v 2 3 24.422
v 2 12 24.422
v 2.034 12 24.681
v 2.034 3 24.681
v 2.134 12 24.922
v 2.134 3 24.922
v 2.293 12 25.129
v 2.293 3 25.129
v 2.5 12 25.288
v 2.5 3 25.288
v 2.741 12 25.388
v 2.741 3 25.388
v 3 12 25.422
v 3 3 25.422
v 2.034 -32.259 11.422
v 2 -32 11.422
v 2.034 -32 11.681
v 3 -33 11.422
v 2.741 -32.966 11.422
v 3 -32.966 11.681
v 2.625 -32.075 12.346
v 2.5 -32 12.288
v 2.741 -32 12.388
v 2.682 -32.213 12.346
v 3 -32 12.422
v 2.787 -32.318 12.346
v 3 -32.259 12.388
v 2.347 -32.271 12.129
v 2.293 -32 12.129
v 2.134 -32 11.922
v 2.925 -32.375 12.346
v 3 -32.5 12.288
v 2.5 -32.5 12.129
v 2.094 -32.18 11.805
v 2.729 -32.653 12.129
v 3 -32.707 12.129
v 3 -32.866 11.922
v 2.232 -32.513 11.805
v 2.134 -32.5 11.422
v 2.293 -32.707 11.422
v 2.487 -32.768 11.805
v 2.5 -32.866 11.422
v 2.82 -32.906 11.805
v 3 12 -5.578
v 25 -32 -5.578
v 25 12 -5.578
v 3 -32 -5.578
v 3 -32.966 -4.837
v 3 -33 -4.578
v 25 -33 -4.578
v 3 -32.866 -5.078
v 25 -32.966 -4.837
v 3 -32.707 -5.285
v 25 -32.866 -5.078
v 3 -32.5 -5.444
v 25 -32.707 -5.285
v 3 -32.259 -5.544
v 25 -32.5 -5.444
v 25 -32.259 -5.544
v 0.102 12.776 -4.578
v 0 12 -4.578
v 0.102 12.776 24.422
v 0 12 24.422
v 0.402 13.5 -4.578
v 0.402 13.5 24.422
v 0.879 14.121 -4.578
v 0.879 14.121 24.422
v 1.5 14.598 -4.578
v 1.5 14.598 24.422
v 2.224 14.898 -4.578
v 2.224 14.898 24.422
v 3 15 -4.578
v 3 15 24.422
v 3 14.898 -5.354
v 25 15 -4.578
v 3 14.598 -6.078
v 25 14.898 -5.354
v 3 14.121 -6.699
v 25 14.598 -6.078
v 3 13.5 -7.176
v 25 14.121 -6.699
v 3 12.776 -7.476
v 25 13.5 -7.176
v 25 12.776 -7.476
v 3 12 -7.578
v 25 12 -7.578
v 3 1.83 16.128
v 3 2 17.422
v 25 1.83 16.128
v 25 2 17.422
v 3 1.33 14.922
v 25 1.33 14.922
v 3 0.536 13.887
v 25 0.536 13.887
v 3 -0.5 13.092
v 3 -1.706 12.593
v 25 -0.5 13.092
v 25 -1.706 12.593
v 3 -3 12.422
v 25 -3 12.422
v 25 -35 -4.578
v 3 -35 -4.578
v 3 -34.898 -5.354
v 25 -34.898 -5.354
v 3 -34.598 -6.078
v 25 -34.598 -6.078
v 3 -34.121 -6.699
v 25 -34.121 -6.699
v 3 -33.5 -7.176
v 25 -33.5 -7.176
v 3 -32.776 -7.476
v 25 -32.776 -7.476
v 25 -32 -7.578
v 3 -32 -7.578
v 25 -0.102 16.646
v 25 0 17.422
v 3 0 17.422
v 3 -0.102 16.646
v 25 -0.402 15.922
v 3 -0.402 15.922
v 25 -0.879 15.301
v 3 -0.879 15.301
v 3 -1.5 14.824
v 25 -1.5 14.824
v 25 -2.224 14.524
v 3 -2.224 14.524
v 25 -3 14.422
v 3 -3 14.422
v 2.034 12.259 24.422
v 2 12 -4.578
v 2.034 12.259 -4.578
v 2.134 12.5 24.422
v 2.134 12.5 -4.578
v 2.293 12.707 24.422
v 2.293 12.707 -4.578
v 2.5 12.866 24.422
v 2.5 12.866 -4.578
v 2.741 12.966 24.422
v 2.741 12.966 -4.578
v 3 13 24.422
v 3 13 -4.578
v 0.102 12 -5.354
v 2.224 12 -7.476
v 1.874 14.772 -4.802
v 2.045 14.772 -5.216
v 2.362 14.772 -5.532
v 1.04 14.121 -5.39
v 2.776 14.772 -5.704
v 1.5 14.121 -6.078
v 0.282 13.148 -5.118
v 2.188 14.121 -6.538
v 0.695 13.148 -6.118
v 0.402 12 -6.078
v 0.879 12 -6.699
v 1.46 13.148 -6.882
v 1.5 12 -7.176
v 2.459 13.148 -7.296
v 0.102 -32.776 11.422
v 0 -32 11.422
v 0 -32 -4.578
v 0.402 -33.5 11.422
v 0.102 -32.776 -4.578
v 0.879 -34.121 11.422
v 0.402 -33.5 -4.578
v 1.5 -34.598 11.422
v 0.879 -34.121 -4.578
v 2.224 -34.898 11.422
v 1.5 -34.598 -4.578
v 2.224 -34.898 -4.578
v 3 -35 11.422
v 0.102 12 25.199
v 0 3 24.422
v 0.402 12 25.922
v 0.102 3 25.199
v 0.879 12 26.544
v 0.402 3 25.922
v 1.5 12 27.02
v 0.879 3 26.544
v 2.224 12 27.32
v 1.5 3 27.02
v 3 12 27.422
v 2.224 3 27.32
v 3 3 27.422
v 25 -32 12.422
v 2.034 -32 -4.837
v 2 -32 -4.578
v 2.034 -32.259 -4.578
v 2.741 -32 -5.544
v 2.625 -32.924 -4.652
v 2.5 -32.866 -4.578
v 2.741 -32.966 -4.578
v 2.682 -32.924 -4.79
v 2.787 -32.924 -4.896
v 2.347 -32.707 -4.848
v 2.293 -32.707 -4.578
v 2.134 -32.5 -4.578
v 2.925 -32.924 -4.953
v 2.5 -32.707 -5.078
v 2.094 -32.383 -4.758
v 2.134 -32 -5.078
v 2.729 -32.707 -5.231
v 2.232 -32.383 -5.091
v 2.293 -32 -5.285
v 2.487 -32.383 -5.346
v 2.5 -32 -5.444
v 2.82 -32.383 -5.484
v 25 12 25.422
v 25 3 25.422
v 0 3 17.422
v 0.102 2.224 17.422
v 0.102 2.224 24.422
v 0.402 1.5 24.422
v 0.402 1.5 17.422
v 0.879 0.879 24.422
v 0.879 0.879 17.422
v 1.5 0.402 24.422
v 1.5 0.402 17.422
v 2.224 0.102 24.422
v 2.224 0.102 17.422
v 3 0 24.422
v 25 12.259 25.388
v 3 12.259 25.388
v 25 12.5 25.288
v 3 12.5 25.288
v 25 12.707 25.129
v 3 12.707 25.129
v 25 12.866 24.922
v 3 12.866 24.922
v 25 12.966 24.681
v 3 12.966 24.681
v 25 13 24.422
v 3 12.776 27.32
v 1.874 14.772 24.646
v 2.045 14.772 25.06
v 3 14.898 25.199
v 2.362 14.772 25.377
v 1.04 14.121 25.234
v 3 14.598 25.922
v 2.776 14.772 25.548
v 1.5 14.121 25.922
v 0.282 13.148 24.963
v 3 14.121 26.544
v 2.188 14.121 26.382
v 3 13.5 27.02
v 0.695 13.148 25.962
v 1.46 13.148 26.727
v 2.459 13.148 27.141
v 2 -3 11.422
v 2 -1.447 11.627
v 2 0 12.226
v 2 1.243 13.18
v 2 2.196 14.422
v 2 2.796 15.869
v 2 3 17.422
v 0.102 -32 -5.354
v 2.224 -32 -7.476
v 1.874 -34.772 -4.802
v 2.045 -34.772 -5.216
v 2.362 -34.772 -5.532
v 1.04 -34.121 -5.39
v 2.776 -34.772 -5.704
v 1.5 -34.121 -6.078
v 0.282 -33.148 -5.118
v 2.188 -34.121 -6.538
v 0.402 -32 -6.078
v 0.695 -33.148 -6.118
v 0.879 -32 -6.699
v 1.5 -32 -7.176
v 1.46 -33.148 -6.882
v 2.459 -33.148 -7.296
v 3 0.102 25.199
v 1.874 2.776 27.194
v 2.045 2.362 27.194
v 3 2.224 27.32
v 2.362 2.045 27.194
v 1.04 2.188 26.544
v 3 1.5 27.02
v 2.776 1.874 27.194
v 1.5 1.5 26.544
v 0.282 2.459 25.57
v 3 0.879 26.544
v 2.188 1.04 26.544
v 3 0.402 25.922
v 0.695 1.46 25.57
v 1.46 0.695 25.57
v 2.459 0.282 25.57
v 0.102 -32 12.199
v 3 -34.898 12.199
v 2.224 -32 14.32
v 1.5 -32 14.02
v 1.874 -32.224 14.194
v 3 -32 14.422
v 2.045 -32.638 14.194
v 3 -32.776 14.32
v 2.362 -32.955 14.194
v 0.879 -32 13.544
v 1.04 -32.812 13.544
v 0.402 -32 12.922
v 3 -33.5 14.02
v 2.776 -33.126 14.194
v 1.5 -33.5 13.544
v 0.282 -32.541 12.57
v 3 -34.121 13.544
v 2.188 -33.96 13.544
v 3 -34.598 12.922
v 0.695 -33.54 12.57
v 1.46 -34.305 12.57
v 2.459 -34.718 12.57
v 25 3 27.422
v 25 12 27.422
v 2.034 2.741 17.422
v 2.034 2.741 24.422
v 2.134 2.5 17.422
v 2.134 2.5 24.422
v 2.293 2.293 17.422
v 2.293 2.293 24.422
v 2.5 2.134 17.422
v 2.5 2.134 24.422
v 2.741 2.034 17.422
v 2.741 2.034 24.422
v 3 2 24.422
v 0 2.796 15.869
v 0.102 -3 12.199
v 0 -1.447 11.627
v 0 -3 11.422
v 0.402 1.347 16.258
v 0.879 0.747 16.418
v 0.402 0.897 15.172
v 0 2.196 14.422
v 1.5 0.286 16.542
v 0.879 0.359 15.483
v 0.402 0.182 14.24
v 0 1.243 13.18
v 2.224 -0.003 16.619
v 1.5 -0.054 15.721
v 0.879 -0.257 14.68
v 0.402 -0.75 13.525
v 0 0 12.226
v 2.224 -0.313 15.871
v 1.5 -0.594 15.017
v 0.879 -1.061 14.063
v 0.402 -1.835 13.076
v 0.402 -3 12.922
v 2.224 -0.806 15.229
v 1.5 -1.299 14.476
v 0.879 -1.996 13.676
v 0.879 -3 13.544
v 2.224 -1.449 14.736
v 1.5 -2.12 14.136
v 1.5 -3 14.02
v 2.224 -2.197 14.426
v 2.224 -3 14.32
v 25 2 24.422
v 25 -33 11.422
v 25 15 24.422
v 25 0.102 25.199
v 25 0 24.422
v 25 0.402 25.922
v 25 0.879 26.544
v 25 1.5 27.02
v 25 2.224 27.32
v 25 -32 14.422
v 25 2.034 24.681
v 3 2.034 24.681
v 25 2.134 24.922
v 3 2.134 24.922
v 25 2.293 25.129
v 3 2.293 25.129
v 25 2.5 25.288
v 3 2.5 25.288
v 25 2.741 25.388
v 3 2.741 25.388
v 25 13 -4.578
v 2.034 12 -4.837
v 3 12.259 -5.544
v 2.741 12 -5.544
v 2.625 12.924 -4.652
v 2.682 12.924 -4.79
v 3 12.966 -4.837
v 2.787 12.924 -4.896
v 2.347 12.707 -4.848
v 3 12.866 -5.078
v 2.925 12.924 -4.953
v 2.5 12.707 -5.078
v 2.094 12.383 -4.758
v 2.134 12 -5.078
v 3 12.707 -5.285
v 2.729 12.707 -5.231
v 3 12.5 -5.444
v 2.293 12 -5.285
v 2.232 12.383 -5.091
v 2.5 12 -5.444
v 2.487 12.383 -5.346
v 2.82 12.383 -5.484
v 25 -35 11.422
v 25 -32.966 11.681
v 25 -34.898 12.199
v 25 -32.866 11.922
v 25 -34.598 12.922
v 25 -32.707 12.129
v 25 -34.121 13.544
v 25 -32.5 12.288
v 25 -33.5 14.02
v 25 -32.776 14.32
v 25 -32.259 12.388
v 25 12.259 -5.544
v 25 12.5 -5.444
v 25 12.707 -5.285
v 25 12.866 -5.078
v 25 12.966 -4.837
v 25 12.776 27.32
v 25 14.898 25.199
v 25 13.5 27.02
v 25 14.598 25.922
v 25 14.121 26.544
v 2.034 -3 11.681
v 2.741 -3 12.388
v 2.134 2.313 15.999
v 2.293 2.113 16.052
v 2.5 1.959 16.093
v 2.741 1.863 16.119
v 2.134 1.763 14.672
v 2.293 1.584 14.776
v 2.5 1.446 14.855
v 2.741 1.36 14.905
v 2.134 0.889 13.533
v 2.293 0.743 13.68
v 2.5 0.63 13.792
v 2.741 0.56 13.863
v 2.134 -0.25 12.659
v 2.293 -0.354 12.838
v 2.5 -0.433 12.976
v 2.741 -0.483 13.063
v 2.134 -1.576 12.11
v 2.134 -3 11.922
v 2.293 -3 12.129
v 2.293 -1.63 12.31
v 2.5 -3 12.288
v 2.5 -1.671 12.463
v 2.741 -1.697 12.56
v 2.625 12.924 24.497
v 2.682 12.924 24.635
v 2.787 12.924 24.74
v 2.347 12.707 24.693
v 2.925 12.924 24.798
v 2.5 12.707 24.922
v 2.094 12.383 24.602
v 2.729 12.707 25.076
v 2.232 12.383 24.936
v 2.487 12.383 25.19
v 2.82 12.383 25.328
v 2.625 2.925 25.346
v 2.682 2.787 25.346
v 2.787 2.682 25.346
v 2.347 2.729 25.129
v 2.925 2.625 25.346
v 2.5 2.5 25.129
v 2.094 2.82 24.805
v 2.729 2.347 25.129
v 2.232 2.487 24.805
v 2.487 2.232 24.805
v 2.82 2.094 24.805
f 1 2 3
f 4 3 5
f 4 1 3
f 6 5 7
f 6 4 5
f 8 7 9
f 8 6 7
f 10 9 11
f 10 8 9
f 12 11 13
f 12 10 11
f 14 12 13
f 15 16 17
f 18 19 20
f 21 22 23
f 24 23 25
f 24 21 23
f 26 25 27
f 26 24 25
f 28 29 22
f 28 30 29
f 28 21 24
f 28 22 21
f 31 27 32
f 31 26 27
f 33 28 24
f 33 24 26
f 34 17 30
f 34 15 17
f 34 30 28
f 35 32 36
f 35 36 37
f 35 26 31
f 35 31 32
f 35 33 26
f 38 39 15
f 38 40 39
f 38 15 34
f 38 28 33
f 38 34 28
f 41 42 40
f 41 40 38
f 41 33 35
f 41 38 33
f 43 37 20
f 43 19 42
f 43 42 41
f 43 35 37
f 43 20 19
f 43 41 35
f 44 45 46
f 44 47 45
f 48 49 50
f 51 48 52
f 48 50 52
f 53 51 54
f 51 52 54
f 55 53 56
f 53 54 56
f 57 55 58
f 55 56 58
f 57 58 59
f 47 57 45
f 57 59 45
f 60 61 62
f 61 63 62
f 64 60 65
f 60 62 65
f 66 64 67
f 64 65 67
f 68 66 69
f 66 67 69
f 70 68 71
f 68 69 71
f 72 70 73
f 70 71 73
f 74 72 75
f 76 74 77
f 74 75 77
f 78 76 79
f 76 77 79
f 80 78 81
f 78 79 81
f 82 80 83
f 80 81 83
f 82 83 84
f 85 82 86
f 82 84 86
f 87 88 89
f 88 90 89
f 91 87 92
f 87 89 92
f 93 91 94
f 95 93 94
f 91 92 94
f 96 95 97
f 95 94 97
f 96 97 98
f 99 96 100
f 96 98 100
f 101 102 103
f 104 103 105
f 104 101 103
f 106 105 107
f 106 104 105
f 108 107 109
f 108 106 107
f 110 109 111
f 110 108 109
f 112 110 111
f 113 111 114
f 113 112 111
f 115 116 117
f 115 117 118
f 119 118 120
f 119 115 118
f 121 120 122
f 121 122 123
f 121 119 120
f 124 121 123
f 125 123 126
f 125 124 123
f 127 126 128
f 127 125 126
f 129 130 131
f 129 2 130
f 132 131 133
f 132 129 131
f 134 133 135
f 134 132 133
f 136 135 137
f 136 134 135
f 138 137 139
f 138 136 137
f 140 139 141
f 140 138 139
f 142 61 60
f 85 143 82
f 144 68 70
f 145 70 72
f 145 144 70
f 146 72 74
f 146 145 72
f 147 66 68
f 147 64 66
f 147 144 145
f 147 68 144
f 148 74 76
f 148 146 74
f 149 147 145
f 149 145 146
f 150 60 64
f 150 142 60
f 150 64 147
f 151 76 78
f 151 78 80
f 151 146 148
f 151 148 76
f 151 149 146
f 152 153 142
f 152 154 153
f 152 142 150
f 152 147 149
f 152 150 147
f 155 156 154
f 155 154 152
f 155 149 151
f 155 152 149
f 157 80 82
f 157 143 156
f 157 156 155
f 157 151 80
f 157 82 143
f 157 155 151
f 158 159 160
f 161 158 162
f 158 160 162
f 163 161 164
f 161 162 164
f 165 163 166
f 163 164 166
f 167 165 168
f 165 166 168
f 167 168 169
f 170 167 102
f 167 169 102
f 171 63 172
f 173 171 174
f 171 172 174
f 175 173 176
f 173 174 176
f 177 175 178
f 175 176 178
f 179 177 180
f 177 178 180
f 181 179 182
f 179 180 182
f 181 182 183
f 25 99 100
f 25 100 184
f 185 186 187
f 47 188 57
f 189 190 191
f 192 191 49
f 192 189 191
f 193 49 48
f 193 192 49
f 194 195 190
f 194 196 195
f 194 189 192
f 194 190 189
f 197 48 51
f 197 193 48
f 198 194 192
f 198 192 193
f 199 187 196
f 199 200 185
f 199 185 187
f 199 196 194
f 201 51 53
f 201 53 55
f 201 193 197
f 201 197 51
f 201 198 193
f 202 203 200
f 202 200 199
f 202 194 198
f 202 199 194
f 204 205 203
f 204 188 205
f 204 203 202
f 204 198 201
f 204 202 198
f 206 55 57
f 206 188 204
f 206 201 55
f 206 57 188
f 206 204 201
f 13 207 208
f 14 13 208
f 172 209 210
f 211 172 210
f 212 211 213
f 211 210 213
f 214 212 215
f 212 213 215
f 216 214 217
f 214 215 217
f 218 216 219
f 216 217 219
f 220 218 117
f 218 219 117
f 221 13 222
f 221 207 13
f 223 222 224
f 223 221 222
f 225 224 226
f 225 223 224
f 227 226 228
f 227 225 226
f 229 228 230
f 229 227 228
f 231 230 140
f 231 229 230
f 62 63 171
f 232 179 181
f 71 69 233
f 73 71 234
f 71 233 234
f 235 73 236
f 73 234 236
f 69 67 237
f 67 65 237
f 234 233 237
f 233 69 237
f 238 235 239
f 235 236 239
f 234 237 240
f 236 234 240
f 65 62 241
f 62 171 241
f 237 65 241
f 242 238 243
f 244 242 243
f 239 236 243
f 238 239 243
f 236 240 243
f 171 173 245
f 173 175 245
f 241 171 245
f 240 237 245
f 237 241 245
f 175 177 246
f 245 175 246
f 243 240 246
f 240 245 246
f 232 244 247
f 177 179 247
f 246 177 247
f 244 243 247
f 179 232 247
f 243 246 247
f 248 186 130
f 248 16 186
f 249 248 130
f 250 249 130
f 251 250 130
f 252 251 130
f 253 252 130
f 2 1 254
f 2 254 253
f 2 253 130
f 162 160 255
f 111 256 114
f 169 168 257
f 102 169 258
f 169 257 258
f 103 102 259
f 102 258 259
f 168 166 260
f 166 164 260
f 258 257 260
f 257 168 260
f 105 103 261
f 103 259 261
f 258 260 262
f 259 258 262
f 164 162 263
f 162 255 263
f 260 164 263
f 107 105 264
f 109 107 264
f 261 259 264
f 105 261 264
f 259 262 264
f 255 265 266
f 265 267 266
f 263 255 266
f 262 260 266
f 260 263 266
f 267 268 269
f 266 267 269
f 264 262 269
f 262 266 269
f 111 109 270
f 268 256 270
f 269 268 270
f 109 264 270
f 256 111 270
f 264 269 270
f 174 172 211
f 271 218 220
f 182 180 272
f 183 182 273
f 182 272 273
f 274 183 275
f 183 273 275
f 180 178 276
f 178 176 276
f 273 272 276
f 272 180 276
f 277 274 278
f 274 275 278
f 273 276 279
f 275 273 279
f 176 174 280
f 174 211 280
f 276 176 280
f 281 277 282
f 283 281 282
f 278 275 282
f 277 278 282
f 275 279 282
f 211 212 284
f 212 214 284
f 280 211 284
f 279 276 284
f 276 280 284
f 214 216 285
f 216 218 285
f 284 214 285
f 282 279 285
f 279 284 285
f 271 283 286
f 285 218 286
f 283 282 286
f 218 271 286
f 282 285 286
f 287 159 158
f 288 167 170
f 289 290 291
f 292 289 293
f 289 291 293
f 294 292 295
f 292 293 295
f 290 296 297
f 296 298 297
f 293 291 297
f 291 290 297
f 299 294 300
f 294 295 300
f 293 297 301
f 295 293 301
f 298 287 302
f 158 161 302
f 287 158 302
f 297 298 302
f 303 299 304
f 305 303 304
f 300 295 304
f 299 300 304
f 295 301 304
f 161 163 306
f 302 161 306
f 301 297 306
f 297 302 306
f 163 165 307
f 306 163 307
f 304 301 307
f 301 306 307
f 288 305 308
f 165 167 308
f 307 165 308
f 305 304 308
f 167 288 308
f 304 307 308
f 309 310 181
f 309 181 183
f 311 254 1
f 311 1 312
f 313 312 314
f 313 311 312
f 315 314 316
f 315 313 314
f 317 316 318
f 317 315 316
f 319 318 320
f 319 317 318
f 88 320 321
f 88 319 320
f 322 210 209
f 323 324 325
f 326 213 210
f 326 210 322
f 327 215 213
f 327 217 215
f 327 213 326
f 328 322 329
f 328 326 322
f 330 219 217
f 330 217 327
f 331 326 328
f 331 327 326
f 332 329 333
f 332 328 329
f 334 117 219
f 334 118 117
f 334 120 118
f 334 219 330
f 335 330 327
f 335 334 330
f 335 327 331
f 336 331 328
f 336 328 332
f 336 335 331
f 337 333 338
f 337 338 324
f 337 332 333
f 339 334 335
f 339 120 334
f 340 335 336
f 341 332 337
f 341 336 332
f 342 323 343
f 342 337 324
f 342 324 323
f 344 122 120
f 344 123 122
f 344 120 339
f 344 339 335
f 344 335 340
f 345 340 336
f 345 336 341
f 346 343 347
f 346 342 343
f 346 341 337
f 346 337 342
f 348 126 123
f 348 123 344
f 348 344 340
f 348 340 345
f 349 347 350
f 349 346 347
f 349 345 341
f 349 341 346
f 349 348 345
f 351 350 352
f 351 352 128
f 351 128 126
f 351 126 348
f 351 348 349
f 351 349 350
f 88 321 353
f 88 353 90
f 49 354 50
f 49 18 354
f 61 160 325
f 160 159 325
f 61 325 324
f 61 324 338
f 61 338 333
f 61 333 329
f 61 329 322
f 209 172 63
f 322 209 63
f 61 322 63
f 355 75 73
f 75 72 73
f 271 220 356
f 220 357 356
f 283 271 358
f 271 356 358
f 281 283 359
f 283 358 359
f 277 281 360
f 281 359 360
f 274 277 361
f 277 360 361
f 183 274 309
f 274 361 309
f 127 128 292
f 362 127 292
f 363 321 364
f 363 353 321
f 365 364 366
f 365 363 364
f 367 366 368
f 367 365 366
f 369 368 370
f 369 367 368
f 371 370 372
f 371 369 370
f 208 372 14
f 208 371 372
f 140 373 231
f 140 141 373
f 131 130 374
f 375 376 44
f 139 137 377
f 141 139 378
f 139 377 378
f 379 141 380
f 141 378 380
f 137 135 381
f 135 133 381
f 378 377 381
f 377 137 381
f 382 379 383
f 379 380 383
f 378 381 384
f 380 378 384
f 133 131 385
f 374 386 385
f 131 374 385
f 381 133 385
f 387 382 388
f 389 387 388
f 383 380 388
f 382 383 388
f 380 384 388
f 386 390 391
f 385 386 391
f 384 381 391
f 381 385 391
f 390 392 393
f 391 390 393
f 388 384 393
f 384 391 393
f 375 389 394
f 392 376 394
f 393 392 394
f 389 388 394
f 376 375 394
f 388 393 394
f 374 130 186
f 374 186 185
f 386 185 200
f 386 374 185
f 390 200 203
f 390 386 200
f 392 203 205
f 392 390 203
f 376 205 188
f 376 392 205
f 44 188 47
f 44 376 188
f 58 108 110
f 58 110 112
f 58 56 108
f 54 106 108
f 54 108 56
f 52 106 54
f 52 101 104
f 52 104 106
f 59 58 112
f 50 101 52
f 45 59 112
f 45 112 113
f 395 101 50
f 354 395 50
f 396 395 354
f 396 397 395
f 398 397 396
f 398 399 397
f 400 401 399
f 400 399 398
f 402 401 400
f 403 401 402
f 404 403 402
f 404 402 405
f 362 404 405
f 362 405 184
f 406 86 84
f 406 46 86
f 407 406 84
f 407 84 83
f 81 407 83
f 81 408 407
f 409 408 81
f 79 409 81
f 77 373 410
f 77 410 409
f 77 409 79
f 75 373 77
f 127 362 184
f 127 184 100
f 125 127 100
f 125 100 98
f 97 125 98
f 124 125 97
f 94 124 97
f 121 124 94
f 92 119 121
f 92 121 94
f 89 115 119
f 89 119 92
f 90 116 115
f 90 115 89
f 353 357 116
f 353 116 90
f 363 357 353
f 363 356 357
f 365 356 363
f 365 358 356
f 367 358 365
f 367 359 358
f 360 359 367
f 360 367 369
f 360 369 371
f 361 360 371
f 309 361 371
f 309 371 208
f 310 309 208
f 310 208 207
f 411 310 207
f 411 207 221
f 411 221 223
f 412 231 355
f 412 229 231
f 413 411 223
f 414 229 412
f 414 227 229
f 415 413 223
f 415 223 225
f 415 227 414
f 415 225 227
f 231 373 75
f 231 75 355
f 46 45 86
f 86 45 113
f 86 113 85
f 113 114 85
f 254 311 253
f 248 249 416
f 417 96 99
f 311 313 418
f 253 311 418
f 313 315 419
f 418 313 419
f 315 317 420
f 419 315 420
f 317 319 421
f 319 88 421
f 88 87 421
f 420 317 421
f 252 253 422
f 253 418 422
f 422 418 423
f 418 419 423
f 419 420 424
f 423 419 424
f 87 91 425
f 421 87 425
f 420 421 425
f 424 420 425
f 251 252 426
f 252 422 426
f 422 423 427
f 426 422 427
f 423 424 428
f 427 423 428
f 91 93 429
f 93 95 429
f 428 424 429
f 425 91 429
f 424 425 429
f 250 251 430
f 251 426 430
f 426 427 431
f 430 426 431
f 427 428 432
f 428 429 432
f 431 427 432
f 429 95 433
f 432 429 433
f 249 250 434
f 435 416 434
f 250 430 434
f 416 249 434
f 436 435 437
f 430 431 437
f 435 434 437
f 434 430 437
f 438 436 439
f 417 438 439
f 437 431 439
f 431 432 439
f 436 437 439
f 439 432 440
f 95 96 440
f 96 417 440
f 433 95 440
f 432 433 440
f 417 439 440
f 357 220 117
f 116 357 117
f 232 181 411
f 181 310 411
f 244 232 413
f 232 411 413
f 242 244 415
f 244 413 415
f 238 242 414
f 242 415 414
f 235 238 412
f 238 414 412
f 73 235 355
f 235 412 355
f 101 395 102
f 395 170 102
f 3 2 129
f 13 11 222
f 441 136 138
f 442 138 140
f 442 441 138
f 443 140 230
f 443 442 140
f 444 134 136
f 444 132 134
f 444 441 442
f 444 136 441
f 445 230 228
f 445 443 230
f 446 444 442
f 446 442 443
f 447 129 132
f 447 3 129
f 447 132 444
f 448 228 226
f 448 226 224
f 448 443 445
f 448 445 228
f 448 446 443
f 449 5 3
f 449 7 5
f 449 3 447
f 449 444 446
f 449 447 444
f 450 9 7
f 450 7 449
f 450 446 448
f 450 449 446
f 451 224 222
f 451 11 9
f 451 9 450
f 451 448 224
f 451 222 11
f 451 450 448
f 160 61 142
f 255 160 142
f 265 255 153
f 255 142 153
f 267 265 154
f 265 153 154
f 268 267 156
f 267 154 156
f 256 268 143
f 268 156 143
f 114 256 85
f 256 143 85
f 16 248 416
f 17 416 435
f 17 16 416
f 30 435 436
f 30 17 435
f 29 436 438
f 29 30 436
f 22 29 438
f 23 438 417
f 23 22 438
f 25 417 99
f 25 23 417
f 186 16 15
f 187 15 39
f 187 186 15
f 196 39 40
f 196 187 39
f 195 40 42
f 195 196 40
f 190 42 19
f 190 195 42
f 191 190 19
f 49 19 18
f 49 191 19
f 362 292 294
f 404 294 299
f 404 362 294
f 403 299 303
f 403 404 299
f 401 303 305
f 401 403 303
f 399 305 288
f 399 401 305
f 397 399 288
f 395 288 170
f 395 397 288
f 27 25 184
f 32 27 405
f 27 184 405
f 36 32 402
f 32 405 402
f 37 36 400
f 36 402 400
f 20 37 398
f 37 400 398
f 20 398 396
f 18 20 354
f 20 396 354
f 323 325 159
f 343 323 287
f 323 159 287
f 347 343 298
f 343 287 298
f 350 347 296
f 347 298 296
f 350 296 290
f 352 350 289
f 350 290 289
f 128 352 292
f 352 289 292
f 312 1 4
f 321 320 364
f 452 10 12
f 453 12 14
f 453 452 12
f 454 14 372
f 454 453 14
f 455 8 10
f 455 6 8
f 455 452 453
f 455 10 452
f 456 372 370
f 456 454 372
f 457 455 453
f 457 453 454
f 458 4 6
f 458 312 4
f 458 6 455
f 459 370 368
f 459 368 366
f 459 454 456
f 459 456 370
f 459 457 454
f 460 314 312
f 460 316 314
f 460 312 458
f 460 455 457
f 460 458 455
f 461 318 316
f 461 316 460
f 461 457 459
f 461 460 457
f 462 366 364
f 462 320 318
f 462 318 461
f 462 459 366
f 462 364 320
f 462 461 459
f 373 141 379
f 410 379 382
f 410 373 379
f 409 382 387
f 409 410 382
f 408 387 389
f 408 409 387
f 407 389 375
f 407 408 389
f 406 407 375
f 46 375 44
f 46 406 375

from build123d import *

# Parameters (mm, degrees)
F1_DEPTH = 25
F2_F1_R  = 3
F2_F2_R  = 3
F3_T     = -2


with BuildPart() as f1:
    # F0 (on Right) → F1 (new body)
    with BuildSketch(Plane.YZ):
        Polygon((0, 27.4222218948), (0, 14.4222218948), (-35, 14.4222218948), (-35, -7.5777781052), (15, -7.5777781052), (15, 27.4222218948), align=None)
    extrude(amount=F1_DEPTH)

    # F2: fillet of radius 3 on 11 edges, made by hand

    # F2_f1
    f2_f1_edges = [f1.edges().sort_by_distance(p)[0] for p in [
        (12.5, 0, 14.4222218948),
    ]]
    fillet(f2_f1_edges, radius=F2_F1_R)

    # F2_f2
    f2_f2_edges = [f1.edges().sort_by_distance(p)[0] for p in [
        (0, -10, -7.5777781052),
        (0, -35, 3.4222218948),
        (0, -19, 14.4222218948),
        (0, 7.5, 27.4222218948),
        (0, 15, 9.9222218948),
        (12.5, 15, -7.5777781052),
        (12.5, -35, -7.5777781052),
        (12.5, -35, 14.4222218948),
        (12.5, 0, 27.4222218948),
        (12.5, 15, 27.4222218948),
        (0, -0.8786796564, 15.3009015512),
    ]]
    fillet(f2_f2_edges, radius=F2_F2_R)

    # F3
    f3_openings = [f1.faces().sort_by_distance(p)[0] for p in [
        (25, -7.351061, 6.036173),
    ]]
    offset(amount=F3_T, openings=f3_openings)


solid = f1.part
